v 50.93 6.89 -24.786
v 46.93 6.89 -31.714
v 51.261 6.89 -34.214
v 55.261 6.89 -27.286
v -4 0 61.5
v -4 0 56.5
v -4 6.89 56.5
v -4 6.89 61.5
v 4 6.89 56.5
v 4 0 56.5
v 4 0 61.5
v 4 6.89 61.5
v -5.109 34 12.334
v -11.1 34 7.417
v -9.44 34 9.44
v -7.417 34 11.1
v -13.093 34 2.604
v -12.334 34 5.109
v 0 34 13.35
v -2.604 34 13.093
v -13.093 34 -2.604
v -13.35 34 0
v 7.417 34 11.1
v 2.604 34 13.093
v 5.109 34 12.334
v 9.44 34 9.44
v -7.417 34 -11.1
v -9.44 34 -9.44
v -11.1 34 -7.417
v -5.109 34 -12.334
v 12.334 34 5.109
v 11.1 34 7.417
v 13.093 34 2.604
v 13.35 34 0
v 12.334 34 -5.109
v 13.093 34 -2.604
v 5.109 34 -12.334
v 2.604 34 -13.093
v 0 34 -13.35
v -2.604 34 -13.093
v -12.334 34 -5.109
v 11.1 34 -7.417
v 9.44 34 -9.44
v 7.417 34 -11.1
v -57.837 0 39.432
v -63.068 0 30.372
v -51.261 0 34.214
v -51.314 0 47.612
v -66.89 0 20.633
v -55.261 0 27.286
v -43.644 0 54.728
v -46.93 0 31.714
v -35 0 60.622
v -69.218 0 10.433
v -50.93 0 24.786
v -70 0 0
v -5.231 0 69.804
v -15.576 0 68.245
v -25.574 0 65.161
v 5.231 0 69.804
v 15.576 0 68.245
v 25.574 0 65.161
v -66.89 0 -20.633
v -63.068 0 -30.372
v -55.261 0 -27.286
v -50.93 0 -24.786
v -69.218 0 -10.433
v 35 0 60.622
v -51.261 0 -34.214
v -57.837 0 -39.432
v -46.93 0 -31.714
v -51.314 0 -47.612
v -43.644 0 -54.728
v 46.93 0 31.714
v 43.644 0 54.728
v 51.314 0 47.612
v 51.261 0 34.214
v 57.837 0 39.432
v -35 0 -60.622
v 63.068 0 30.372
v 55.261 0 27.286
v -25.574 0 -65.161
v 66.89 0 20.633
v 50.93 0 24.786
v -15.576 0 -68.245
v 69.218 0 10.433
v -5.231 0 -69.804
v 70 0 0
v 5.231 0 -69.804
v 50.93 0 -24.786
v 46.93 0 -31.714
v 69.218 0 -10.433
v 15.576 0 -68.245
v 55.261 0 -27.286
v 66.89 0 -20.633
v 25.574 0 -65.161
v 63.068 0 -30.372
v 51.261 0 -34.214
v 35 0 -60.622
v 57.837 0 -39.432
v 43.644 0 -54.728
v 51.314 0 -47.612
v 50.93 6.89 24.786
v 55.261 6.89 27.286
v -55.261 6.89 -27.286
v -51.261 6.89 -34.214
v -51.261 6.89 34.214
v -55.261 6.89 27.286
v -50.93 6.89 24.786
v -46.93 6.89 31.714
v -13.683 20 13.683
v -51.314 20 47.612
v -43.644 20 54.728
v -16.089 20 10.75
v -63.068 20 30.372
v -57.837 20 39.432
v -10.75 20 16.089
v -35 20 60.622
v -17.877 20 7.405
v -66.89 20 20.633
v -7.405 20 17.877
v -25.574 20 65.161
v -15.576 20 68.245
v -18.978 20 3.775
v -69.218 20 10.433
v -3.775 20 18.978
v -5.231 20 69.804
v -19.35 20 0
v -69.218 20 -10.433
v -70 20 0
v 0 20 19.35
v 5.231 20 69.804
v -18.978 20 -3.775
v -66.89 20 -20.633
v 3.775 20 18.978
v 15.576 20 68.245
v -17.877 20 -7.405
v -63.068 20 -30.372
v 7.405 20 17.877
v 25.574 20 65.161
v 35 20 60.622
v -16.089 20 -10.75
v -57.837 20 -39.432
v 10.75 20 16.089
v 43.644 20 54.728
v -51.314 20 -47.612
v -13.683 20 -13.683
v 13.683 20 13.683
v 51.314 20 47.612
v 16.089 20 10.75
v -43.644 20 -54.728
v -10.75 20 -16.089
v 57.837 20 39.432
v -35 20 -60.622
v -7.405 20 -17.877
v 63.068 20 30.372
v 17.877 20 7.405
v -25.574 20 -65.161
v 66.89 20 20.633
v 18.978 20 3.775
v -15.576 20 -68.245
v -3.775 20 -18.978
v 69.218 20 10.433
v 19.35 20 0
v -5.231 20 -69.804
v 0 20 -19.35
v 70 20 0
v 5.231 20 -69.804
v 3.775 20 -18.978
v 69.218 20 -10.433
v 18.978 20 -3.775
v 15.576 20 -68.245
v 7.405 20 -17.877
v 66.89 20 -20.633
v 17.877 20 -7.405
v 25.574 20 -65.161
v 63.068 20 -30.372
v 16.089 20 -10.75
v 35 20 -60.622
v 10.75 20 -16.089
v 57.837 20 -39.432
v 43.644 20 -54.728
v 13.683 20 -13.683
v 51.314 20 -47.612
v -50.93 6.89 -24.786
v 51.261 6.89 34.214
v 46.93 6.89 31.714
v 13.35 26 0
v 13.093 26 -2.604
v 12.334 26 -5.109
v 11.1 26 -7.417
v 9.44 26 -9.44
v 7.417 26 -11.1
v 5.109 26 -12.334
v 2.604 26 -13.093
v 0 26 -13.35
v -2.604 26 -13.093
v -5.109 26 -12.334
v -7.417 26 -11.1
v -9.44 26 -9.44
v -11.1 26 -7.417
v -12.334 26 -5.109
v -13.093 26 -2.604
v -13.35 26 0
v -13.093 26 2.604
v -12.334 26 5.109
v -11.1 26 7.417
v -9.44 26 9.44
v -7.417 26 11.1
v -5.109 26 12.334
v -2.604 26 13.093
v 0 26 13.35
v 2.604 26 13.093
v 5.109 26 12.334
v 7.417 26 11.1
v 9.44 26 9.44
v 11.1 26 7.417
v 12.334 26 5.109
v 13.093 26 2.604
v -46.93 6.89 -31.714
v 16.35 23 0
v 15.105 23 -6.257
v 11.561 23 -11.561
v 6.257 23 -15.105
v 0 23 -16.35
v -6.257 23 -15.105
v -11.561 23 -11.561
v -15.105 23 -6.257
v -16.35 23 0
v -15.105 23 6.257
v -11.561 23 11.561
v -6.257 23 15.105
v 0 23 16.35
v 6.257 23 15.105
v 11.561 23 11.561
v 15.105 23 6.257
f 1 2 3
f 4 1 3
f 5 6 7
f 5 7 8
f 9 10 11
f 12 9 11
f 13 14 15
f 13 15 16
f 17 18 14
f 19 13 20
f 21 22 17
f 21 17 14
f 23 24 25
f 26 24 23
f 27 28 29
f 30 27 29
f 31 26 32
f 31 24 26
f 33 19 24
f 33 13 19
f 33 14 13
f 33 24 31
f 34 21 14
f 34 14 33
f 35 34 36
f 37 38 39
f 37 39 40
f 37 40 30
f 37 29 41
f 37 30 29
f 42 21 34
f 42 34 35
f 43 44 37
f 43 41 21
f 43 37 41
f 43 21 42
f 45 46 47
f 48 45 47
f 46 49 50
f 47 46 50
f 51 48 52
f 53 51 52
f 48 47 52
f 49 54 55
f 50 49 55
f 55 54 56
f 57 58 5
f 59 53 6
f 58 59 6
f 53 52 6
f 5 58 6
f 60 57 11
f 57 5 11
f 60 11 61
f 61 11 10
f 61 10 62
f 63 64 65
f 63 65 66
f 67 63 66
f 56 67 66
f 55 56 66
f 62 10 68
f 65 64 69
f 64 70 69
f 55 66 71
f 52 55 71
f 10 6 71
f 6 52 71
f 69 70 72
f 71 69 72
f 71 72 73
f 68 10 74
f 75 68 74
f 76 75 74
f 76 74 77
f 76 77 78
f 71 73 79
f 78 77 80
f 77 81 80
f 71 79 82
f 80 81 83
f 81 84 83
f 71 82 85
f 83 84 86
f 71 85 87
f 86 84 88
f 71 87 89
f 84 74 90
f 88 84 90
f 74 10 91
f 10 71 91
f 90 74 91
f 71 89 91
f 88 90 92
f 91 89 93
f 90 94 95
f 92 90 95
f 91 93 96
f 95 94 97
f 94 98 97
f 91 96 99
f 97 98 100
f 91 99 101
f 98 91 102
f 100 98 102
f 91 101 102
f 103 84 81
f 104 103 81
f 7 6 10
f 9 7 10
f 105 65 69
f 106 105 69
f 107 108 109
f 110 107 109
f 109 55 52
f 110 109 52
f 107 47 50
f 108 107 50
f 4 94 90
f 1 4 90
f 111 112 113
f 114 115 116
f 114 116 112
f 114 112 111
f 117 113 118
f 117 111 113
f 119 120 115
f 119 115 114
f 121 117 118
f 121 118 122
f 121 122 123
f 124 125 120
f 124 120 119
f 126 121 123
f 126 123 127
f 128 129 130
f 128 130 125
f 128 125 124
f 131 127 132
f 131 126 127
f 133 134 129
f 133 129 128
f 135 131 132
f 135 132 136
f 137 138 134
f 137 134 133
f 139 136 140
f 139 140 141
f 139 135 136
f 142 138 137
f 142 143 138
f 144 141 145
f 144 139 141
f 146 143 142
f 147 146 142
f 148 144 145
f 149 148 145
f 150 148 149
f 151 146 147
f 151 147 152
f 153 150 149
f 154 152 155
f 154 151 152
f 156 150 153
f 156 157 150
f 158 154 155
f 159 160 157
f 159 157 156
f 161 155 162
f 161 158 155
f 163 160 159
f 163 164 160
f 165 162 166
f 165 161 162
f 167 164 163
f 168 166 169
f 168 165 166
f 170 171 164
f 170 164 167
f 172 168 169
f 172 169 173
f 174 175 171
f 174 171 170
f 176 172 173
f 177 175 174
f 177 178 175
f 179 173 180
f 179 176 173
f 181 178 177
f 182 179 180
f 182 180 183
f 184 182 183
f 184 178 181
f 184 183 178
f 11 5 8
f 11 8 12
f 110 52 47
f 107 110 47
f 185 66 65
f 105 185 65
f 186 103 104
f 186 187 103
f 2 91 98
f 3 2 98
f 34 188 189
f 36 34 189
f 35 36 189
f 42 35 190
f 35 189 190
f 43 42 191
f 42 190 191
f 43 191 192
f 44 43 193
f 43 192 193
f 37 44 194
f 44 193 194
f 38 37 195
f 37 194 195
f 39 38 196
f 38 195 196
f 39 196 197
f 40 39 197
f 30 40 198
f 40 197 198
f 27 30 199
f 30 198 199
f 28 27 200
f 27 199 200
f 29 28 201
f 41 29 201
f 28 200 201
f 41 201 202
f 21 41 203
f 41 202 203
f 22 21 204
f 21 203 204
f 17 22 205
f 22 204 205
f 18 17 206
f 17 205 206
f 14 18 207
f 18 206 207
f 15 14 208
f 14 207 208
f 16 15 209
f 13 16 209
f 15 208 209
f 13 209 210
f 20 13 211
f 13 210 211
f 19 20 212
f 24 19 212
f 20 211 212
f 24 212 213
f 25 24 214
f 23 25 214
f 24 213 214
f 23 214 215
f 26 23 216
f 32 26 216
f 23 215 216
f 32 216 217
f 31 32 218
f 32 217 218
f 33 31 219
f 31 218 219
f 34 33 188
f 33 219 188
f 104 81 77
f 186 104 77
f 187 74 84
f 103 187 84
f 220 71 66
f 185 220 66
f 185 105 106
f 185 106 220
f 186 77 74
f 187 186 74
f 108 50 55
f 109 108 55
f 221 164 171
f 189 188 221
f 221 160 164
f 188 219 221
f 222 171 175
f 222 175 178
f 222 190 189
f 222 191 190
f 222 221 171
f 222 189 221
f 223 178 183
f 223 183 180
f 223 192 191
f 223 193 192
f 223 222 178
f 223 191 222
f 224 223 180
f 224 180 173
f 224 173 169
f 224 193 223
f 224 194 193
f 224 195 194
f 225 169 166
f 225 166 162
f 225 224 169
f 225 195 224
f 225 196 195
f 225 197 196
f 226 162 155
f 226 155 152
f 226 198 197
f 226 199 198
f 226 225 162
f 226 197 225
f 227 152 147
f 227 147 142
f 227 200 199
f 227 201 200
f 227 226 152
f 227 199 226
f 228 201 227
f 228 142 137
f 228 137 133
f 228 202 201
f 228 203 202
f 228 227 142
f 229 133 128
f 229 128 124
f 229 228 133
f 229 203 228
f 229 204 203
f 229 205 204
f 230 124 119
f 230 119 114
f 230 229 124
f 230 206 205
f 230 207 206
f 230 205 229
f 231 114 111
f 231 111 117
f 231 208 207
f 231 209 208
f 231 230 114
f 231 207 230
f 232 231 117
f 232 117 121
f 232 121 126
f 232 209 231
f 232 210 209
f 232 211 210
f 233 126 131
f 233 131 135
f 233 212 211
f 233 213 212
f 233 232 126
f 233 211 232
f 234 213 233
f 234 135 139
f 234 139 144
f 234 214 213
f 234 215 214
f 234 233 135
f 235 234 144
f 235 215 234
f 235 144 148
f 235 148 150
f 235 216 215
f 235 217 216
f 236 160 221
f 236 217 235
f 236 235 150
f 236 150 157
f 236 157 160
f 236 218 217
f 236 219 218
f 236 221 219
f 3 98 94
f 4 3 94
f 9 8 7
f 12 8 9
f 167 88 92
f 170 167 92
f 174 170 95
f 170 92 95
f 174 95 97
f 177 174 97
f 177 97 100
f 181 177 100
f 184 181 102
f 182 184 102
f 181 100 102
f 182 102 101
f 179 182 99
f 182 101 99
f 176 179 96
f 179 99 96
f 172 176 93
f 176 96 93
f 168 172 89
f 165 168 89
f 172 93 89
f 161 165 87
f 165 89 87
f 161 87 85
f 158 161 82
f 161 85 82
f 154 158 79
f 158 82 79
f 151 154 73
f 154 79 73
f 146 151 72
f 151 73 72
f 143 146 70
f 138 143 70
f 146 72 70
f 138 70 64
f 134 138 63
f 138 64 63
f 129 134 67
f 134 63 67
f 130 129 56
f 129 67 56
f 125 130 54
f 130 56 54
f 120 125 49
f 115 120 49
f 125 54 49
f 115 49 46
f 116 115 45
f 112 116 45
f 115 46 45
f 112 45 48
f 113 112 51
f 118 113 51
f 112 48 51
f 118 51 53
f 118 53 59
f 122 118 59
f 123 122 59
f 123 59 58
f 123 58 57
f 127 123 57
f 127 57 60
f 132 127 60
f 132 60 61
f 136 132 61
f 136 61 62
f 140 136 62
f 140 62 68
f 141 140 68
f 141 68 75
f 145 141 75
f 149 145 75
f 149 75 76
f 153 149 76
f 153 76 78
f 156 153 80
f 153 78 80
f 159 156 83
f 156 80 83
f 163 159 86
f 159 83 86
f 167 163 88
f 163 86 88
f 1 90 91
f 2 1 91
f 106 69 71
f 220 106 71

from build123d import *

# Parameters (mm, degrees)
SKETCH1_R           = 70
BOSS_EXTRUDE1_DEPTH = 20
SKETCH2_W           = 8
SKETCH2_H           = 5
CUT_EXTRUDE1_DEPTH  = 6.89
SKETCH3_R           = 13.35
BOSS_EXTRUDE2_DEPTH = 14
CHAMFER1_SIZE       = 6


with BuildPart() as part:
    # Sketch1 → Boss-Extrude1 (new body)
    with BuildSketch(Plane(origin=(0, 0, 0), x_dir=(1, 0, 0), z_dir=(0, 1, 0))):
        Circle(SKETCH1_R)
    extrude(amount=BOSS_EXTRUDE1_DEPTH)

    # Sketch2 → Cut-Extrude1 (cut)
    with BuildSketch(Plane.XZ):
        with Locations((0, 59)):
            Rectangle(SKETCH2_W, SKETCH2_H)
        Polygon((50.930435314, 24.785898385), (55.260562333, 27.285898385), (51.260562333, 34.214101615), (46.930435314, 31.714101615), align=None)
        Polygon((46.930435314, -31.714101615), (51.260562333, -34.214101615), (55.260562333, -27.285898385), (50.930435314, -24.785898385), align=None)
        Polygon((-50.930435314, -24.785898385), (-55.260562333, -27.285898385), (-51.260562333, -34.214101615), (-46.930435314, -31.714101615), align=None)
        Polygon((-46.930435314, 31.714101615), (-51.260562333, 34.214101615), (-55.260562333, 27.285898385), (-50.930435314, 24.785898385), align=None)
    extrude(amount=-CUT_EXTRUDE1_DEPTH, mode=Mode.SUBTRACT)

    # Sketch3 → Boss-Extrude2 (add)
    with BuildSketch(Plane(origin=(0, 20, 0), x_dir=(1, 0, 0), z_dir=(0, 1, 0))):
        Circle(SKETCH3_R)
    extrude(amount=BOSS_EXTRUDE2_DEPTH)

    # Chamfer1
    chamfer1_edges = [part.edges().sort_by_distance(p)[0] for p in [
        (-13.35, 20, 0),
    ]]
    chamfer(chamfer1_edges, length=CHAMFER1_SIZE)


solid = part.part
